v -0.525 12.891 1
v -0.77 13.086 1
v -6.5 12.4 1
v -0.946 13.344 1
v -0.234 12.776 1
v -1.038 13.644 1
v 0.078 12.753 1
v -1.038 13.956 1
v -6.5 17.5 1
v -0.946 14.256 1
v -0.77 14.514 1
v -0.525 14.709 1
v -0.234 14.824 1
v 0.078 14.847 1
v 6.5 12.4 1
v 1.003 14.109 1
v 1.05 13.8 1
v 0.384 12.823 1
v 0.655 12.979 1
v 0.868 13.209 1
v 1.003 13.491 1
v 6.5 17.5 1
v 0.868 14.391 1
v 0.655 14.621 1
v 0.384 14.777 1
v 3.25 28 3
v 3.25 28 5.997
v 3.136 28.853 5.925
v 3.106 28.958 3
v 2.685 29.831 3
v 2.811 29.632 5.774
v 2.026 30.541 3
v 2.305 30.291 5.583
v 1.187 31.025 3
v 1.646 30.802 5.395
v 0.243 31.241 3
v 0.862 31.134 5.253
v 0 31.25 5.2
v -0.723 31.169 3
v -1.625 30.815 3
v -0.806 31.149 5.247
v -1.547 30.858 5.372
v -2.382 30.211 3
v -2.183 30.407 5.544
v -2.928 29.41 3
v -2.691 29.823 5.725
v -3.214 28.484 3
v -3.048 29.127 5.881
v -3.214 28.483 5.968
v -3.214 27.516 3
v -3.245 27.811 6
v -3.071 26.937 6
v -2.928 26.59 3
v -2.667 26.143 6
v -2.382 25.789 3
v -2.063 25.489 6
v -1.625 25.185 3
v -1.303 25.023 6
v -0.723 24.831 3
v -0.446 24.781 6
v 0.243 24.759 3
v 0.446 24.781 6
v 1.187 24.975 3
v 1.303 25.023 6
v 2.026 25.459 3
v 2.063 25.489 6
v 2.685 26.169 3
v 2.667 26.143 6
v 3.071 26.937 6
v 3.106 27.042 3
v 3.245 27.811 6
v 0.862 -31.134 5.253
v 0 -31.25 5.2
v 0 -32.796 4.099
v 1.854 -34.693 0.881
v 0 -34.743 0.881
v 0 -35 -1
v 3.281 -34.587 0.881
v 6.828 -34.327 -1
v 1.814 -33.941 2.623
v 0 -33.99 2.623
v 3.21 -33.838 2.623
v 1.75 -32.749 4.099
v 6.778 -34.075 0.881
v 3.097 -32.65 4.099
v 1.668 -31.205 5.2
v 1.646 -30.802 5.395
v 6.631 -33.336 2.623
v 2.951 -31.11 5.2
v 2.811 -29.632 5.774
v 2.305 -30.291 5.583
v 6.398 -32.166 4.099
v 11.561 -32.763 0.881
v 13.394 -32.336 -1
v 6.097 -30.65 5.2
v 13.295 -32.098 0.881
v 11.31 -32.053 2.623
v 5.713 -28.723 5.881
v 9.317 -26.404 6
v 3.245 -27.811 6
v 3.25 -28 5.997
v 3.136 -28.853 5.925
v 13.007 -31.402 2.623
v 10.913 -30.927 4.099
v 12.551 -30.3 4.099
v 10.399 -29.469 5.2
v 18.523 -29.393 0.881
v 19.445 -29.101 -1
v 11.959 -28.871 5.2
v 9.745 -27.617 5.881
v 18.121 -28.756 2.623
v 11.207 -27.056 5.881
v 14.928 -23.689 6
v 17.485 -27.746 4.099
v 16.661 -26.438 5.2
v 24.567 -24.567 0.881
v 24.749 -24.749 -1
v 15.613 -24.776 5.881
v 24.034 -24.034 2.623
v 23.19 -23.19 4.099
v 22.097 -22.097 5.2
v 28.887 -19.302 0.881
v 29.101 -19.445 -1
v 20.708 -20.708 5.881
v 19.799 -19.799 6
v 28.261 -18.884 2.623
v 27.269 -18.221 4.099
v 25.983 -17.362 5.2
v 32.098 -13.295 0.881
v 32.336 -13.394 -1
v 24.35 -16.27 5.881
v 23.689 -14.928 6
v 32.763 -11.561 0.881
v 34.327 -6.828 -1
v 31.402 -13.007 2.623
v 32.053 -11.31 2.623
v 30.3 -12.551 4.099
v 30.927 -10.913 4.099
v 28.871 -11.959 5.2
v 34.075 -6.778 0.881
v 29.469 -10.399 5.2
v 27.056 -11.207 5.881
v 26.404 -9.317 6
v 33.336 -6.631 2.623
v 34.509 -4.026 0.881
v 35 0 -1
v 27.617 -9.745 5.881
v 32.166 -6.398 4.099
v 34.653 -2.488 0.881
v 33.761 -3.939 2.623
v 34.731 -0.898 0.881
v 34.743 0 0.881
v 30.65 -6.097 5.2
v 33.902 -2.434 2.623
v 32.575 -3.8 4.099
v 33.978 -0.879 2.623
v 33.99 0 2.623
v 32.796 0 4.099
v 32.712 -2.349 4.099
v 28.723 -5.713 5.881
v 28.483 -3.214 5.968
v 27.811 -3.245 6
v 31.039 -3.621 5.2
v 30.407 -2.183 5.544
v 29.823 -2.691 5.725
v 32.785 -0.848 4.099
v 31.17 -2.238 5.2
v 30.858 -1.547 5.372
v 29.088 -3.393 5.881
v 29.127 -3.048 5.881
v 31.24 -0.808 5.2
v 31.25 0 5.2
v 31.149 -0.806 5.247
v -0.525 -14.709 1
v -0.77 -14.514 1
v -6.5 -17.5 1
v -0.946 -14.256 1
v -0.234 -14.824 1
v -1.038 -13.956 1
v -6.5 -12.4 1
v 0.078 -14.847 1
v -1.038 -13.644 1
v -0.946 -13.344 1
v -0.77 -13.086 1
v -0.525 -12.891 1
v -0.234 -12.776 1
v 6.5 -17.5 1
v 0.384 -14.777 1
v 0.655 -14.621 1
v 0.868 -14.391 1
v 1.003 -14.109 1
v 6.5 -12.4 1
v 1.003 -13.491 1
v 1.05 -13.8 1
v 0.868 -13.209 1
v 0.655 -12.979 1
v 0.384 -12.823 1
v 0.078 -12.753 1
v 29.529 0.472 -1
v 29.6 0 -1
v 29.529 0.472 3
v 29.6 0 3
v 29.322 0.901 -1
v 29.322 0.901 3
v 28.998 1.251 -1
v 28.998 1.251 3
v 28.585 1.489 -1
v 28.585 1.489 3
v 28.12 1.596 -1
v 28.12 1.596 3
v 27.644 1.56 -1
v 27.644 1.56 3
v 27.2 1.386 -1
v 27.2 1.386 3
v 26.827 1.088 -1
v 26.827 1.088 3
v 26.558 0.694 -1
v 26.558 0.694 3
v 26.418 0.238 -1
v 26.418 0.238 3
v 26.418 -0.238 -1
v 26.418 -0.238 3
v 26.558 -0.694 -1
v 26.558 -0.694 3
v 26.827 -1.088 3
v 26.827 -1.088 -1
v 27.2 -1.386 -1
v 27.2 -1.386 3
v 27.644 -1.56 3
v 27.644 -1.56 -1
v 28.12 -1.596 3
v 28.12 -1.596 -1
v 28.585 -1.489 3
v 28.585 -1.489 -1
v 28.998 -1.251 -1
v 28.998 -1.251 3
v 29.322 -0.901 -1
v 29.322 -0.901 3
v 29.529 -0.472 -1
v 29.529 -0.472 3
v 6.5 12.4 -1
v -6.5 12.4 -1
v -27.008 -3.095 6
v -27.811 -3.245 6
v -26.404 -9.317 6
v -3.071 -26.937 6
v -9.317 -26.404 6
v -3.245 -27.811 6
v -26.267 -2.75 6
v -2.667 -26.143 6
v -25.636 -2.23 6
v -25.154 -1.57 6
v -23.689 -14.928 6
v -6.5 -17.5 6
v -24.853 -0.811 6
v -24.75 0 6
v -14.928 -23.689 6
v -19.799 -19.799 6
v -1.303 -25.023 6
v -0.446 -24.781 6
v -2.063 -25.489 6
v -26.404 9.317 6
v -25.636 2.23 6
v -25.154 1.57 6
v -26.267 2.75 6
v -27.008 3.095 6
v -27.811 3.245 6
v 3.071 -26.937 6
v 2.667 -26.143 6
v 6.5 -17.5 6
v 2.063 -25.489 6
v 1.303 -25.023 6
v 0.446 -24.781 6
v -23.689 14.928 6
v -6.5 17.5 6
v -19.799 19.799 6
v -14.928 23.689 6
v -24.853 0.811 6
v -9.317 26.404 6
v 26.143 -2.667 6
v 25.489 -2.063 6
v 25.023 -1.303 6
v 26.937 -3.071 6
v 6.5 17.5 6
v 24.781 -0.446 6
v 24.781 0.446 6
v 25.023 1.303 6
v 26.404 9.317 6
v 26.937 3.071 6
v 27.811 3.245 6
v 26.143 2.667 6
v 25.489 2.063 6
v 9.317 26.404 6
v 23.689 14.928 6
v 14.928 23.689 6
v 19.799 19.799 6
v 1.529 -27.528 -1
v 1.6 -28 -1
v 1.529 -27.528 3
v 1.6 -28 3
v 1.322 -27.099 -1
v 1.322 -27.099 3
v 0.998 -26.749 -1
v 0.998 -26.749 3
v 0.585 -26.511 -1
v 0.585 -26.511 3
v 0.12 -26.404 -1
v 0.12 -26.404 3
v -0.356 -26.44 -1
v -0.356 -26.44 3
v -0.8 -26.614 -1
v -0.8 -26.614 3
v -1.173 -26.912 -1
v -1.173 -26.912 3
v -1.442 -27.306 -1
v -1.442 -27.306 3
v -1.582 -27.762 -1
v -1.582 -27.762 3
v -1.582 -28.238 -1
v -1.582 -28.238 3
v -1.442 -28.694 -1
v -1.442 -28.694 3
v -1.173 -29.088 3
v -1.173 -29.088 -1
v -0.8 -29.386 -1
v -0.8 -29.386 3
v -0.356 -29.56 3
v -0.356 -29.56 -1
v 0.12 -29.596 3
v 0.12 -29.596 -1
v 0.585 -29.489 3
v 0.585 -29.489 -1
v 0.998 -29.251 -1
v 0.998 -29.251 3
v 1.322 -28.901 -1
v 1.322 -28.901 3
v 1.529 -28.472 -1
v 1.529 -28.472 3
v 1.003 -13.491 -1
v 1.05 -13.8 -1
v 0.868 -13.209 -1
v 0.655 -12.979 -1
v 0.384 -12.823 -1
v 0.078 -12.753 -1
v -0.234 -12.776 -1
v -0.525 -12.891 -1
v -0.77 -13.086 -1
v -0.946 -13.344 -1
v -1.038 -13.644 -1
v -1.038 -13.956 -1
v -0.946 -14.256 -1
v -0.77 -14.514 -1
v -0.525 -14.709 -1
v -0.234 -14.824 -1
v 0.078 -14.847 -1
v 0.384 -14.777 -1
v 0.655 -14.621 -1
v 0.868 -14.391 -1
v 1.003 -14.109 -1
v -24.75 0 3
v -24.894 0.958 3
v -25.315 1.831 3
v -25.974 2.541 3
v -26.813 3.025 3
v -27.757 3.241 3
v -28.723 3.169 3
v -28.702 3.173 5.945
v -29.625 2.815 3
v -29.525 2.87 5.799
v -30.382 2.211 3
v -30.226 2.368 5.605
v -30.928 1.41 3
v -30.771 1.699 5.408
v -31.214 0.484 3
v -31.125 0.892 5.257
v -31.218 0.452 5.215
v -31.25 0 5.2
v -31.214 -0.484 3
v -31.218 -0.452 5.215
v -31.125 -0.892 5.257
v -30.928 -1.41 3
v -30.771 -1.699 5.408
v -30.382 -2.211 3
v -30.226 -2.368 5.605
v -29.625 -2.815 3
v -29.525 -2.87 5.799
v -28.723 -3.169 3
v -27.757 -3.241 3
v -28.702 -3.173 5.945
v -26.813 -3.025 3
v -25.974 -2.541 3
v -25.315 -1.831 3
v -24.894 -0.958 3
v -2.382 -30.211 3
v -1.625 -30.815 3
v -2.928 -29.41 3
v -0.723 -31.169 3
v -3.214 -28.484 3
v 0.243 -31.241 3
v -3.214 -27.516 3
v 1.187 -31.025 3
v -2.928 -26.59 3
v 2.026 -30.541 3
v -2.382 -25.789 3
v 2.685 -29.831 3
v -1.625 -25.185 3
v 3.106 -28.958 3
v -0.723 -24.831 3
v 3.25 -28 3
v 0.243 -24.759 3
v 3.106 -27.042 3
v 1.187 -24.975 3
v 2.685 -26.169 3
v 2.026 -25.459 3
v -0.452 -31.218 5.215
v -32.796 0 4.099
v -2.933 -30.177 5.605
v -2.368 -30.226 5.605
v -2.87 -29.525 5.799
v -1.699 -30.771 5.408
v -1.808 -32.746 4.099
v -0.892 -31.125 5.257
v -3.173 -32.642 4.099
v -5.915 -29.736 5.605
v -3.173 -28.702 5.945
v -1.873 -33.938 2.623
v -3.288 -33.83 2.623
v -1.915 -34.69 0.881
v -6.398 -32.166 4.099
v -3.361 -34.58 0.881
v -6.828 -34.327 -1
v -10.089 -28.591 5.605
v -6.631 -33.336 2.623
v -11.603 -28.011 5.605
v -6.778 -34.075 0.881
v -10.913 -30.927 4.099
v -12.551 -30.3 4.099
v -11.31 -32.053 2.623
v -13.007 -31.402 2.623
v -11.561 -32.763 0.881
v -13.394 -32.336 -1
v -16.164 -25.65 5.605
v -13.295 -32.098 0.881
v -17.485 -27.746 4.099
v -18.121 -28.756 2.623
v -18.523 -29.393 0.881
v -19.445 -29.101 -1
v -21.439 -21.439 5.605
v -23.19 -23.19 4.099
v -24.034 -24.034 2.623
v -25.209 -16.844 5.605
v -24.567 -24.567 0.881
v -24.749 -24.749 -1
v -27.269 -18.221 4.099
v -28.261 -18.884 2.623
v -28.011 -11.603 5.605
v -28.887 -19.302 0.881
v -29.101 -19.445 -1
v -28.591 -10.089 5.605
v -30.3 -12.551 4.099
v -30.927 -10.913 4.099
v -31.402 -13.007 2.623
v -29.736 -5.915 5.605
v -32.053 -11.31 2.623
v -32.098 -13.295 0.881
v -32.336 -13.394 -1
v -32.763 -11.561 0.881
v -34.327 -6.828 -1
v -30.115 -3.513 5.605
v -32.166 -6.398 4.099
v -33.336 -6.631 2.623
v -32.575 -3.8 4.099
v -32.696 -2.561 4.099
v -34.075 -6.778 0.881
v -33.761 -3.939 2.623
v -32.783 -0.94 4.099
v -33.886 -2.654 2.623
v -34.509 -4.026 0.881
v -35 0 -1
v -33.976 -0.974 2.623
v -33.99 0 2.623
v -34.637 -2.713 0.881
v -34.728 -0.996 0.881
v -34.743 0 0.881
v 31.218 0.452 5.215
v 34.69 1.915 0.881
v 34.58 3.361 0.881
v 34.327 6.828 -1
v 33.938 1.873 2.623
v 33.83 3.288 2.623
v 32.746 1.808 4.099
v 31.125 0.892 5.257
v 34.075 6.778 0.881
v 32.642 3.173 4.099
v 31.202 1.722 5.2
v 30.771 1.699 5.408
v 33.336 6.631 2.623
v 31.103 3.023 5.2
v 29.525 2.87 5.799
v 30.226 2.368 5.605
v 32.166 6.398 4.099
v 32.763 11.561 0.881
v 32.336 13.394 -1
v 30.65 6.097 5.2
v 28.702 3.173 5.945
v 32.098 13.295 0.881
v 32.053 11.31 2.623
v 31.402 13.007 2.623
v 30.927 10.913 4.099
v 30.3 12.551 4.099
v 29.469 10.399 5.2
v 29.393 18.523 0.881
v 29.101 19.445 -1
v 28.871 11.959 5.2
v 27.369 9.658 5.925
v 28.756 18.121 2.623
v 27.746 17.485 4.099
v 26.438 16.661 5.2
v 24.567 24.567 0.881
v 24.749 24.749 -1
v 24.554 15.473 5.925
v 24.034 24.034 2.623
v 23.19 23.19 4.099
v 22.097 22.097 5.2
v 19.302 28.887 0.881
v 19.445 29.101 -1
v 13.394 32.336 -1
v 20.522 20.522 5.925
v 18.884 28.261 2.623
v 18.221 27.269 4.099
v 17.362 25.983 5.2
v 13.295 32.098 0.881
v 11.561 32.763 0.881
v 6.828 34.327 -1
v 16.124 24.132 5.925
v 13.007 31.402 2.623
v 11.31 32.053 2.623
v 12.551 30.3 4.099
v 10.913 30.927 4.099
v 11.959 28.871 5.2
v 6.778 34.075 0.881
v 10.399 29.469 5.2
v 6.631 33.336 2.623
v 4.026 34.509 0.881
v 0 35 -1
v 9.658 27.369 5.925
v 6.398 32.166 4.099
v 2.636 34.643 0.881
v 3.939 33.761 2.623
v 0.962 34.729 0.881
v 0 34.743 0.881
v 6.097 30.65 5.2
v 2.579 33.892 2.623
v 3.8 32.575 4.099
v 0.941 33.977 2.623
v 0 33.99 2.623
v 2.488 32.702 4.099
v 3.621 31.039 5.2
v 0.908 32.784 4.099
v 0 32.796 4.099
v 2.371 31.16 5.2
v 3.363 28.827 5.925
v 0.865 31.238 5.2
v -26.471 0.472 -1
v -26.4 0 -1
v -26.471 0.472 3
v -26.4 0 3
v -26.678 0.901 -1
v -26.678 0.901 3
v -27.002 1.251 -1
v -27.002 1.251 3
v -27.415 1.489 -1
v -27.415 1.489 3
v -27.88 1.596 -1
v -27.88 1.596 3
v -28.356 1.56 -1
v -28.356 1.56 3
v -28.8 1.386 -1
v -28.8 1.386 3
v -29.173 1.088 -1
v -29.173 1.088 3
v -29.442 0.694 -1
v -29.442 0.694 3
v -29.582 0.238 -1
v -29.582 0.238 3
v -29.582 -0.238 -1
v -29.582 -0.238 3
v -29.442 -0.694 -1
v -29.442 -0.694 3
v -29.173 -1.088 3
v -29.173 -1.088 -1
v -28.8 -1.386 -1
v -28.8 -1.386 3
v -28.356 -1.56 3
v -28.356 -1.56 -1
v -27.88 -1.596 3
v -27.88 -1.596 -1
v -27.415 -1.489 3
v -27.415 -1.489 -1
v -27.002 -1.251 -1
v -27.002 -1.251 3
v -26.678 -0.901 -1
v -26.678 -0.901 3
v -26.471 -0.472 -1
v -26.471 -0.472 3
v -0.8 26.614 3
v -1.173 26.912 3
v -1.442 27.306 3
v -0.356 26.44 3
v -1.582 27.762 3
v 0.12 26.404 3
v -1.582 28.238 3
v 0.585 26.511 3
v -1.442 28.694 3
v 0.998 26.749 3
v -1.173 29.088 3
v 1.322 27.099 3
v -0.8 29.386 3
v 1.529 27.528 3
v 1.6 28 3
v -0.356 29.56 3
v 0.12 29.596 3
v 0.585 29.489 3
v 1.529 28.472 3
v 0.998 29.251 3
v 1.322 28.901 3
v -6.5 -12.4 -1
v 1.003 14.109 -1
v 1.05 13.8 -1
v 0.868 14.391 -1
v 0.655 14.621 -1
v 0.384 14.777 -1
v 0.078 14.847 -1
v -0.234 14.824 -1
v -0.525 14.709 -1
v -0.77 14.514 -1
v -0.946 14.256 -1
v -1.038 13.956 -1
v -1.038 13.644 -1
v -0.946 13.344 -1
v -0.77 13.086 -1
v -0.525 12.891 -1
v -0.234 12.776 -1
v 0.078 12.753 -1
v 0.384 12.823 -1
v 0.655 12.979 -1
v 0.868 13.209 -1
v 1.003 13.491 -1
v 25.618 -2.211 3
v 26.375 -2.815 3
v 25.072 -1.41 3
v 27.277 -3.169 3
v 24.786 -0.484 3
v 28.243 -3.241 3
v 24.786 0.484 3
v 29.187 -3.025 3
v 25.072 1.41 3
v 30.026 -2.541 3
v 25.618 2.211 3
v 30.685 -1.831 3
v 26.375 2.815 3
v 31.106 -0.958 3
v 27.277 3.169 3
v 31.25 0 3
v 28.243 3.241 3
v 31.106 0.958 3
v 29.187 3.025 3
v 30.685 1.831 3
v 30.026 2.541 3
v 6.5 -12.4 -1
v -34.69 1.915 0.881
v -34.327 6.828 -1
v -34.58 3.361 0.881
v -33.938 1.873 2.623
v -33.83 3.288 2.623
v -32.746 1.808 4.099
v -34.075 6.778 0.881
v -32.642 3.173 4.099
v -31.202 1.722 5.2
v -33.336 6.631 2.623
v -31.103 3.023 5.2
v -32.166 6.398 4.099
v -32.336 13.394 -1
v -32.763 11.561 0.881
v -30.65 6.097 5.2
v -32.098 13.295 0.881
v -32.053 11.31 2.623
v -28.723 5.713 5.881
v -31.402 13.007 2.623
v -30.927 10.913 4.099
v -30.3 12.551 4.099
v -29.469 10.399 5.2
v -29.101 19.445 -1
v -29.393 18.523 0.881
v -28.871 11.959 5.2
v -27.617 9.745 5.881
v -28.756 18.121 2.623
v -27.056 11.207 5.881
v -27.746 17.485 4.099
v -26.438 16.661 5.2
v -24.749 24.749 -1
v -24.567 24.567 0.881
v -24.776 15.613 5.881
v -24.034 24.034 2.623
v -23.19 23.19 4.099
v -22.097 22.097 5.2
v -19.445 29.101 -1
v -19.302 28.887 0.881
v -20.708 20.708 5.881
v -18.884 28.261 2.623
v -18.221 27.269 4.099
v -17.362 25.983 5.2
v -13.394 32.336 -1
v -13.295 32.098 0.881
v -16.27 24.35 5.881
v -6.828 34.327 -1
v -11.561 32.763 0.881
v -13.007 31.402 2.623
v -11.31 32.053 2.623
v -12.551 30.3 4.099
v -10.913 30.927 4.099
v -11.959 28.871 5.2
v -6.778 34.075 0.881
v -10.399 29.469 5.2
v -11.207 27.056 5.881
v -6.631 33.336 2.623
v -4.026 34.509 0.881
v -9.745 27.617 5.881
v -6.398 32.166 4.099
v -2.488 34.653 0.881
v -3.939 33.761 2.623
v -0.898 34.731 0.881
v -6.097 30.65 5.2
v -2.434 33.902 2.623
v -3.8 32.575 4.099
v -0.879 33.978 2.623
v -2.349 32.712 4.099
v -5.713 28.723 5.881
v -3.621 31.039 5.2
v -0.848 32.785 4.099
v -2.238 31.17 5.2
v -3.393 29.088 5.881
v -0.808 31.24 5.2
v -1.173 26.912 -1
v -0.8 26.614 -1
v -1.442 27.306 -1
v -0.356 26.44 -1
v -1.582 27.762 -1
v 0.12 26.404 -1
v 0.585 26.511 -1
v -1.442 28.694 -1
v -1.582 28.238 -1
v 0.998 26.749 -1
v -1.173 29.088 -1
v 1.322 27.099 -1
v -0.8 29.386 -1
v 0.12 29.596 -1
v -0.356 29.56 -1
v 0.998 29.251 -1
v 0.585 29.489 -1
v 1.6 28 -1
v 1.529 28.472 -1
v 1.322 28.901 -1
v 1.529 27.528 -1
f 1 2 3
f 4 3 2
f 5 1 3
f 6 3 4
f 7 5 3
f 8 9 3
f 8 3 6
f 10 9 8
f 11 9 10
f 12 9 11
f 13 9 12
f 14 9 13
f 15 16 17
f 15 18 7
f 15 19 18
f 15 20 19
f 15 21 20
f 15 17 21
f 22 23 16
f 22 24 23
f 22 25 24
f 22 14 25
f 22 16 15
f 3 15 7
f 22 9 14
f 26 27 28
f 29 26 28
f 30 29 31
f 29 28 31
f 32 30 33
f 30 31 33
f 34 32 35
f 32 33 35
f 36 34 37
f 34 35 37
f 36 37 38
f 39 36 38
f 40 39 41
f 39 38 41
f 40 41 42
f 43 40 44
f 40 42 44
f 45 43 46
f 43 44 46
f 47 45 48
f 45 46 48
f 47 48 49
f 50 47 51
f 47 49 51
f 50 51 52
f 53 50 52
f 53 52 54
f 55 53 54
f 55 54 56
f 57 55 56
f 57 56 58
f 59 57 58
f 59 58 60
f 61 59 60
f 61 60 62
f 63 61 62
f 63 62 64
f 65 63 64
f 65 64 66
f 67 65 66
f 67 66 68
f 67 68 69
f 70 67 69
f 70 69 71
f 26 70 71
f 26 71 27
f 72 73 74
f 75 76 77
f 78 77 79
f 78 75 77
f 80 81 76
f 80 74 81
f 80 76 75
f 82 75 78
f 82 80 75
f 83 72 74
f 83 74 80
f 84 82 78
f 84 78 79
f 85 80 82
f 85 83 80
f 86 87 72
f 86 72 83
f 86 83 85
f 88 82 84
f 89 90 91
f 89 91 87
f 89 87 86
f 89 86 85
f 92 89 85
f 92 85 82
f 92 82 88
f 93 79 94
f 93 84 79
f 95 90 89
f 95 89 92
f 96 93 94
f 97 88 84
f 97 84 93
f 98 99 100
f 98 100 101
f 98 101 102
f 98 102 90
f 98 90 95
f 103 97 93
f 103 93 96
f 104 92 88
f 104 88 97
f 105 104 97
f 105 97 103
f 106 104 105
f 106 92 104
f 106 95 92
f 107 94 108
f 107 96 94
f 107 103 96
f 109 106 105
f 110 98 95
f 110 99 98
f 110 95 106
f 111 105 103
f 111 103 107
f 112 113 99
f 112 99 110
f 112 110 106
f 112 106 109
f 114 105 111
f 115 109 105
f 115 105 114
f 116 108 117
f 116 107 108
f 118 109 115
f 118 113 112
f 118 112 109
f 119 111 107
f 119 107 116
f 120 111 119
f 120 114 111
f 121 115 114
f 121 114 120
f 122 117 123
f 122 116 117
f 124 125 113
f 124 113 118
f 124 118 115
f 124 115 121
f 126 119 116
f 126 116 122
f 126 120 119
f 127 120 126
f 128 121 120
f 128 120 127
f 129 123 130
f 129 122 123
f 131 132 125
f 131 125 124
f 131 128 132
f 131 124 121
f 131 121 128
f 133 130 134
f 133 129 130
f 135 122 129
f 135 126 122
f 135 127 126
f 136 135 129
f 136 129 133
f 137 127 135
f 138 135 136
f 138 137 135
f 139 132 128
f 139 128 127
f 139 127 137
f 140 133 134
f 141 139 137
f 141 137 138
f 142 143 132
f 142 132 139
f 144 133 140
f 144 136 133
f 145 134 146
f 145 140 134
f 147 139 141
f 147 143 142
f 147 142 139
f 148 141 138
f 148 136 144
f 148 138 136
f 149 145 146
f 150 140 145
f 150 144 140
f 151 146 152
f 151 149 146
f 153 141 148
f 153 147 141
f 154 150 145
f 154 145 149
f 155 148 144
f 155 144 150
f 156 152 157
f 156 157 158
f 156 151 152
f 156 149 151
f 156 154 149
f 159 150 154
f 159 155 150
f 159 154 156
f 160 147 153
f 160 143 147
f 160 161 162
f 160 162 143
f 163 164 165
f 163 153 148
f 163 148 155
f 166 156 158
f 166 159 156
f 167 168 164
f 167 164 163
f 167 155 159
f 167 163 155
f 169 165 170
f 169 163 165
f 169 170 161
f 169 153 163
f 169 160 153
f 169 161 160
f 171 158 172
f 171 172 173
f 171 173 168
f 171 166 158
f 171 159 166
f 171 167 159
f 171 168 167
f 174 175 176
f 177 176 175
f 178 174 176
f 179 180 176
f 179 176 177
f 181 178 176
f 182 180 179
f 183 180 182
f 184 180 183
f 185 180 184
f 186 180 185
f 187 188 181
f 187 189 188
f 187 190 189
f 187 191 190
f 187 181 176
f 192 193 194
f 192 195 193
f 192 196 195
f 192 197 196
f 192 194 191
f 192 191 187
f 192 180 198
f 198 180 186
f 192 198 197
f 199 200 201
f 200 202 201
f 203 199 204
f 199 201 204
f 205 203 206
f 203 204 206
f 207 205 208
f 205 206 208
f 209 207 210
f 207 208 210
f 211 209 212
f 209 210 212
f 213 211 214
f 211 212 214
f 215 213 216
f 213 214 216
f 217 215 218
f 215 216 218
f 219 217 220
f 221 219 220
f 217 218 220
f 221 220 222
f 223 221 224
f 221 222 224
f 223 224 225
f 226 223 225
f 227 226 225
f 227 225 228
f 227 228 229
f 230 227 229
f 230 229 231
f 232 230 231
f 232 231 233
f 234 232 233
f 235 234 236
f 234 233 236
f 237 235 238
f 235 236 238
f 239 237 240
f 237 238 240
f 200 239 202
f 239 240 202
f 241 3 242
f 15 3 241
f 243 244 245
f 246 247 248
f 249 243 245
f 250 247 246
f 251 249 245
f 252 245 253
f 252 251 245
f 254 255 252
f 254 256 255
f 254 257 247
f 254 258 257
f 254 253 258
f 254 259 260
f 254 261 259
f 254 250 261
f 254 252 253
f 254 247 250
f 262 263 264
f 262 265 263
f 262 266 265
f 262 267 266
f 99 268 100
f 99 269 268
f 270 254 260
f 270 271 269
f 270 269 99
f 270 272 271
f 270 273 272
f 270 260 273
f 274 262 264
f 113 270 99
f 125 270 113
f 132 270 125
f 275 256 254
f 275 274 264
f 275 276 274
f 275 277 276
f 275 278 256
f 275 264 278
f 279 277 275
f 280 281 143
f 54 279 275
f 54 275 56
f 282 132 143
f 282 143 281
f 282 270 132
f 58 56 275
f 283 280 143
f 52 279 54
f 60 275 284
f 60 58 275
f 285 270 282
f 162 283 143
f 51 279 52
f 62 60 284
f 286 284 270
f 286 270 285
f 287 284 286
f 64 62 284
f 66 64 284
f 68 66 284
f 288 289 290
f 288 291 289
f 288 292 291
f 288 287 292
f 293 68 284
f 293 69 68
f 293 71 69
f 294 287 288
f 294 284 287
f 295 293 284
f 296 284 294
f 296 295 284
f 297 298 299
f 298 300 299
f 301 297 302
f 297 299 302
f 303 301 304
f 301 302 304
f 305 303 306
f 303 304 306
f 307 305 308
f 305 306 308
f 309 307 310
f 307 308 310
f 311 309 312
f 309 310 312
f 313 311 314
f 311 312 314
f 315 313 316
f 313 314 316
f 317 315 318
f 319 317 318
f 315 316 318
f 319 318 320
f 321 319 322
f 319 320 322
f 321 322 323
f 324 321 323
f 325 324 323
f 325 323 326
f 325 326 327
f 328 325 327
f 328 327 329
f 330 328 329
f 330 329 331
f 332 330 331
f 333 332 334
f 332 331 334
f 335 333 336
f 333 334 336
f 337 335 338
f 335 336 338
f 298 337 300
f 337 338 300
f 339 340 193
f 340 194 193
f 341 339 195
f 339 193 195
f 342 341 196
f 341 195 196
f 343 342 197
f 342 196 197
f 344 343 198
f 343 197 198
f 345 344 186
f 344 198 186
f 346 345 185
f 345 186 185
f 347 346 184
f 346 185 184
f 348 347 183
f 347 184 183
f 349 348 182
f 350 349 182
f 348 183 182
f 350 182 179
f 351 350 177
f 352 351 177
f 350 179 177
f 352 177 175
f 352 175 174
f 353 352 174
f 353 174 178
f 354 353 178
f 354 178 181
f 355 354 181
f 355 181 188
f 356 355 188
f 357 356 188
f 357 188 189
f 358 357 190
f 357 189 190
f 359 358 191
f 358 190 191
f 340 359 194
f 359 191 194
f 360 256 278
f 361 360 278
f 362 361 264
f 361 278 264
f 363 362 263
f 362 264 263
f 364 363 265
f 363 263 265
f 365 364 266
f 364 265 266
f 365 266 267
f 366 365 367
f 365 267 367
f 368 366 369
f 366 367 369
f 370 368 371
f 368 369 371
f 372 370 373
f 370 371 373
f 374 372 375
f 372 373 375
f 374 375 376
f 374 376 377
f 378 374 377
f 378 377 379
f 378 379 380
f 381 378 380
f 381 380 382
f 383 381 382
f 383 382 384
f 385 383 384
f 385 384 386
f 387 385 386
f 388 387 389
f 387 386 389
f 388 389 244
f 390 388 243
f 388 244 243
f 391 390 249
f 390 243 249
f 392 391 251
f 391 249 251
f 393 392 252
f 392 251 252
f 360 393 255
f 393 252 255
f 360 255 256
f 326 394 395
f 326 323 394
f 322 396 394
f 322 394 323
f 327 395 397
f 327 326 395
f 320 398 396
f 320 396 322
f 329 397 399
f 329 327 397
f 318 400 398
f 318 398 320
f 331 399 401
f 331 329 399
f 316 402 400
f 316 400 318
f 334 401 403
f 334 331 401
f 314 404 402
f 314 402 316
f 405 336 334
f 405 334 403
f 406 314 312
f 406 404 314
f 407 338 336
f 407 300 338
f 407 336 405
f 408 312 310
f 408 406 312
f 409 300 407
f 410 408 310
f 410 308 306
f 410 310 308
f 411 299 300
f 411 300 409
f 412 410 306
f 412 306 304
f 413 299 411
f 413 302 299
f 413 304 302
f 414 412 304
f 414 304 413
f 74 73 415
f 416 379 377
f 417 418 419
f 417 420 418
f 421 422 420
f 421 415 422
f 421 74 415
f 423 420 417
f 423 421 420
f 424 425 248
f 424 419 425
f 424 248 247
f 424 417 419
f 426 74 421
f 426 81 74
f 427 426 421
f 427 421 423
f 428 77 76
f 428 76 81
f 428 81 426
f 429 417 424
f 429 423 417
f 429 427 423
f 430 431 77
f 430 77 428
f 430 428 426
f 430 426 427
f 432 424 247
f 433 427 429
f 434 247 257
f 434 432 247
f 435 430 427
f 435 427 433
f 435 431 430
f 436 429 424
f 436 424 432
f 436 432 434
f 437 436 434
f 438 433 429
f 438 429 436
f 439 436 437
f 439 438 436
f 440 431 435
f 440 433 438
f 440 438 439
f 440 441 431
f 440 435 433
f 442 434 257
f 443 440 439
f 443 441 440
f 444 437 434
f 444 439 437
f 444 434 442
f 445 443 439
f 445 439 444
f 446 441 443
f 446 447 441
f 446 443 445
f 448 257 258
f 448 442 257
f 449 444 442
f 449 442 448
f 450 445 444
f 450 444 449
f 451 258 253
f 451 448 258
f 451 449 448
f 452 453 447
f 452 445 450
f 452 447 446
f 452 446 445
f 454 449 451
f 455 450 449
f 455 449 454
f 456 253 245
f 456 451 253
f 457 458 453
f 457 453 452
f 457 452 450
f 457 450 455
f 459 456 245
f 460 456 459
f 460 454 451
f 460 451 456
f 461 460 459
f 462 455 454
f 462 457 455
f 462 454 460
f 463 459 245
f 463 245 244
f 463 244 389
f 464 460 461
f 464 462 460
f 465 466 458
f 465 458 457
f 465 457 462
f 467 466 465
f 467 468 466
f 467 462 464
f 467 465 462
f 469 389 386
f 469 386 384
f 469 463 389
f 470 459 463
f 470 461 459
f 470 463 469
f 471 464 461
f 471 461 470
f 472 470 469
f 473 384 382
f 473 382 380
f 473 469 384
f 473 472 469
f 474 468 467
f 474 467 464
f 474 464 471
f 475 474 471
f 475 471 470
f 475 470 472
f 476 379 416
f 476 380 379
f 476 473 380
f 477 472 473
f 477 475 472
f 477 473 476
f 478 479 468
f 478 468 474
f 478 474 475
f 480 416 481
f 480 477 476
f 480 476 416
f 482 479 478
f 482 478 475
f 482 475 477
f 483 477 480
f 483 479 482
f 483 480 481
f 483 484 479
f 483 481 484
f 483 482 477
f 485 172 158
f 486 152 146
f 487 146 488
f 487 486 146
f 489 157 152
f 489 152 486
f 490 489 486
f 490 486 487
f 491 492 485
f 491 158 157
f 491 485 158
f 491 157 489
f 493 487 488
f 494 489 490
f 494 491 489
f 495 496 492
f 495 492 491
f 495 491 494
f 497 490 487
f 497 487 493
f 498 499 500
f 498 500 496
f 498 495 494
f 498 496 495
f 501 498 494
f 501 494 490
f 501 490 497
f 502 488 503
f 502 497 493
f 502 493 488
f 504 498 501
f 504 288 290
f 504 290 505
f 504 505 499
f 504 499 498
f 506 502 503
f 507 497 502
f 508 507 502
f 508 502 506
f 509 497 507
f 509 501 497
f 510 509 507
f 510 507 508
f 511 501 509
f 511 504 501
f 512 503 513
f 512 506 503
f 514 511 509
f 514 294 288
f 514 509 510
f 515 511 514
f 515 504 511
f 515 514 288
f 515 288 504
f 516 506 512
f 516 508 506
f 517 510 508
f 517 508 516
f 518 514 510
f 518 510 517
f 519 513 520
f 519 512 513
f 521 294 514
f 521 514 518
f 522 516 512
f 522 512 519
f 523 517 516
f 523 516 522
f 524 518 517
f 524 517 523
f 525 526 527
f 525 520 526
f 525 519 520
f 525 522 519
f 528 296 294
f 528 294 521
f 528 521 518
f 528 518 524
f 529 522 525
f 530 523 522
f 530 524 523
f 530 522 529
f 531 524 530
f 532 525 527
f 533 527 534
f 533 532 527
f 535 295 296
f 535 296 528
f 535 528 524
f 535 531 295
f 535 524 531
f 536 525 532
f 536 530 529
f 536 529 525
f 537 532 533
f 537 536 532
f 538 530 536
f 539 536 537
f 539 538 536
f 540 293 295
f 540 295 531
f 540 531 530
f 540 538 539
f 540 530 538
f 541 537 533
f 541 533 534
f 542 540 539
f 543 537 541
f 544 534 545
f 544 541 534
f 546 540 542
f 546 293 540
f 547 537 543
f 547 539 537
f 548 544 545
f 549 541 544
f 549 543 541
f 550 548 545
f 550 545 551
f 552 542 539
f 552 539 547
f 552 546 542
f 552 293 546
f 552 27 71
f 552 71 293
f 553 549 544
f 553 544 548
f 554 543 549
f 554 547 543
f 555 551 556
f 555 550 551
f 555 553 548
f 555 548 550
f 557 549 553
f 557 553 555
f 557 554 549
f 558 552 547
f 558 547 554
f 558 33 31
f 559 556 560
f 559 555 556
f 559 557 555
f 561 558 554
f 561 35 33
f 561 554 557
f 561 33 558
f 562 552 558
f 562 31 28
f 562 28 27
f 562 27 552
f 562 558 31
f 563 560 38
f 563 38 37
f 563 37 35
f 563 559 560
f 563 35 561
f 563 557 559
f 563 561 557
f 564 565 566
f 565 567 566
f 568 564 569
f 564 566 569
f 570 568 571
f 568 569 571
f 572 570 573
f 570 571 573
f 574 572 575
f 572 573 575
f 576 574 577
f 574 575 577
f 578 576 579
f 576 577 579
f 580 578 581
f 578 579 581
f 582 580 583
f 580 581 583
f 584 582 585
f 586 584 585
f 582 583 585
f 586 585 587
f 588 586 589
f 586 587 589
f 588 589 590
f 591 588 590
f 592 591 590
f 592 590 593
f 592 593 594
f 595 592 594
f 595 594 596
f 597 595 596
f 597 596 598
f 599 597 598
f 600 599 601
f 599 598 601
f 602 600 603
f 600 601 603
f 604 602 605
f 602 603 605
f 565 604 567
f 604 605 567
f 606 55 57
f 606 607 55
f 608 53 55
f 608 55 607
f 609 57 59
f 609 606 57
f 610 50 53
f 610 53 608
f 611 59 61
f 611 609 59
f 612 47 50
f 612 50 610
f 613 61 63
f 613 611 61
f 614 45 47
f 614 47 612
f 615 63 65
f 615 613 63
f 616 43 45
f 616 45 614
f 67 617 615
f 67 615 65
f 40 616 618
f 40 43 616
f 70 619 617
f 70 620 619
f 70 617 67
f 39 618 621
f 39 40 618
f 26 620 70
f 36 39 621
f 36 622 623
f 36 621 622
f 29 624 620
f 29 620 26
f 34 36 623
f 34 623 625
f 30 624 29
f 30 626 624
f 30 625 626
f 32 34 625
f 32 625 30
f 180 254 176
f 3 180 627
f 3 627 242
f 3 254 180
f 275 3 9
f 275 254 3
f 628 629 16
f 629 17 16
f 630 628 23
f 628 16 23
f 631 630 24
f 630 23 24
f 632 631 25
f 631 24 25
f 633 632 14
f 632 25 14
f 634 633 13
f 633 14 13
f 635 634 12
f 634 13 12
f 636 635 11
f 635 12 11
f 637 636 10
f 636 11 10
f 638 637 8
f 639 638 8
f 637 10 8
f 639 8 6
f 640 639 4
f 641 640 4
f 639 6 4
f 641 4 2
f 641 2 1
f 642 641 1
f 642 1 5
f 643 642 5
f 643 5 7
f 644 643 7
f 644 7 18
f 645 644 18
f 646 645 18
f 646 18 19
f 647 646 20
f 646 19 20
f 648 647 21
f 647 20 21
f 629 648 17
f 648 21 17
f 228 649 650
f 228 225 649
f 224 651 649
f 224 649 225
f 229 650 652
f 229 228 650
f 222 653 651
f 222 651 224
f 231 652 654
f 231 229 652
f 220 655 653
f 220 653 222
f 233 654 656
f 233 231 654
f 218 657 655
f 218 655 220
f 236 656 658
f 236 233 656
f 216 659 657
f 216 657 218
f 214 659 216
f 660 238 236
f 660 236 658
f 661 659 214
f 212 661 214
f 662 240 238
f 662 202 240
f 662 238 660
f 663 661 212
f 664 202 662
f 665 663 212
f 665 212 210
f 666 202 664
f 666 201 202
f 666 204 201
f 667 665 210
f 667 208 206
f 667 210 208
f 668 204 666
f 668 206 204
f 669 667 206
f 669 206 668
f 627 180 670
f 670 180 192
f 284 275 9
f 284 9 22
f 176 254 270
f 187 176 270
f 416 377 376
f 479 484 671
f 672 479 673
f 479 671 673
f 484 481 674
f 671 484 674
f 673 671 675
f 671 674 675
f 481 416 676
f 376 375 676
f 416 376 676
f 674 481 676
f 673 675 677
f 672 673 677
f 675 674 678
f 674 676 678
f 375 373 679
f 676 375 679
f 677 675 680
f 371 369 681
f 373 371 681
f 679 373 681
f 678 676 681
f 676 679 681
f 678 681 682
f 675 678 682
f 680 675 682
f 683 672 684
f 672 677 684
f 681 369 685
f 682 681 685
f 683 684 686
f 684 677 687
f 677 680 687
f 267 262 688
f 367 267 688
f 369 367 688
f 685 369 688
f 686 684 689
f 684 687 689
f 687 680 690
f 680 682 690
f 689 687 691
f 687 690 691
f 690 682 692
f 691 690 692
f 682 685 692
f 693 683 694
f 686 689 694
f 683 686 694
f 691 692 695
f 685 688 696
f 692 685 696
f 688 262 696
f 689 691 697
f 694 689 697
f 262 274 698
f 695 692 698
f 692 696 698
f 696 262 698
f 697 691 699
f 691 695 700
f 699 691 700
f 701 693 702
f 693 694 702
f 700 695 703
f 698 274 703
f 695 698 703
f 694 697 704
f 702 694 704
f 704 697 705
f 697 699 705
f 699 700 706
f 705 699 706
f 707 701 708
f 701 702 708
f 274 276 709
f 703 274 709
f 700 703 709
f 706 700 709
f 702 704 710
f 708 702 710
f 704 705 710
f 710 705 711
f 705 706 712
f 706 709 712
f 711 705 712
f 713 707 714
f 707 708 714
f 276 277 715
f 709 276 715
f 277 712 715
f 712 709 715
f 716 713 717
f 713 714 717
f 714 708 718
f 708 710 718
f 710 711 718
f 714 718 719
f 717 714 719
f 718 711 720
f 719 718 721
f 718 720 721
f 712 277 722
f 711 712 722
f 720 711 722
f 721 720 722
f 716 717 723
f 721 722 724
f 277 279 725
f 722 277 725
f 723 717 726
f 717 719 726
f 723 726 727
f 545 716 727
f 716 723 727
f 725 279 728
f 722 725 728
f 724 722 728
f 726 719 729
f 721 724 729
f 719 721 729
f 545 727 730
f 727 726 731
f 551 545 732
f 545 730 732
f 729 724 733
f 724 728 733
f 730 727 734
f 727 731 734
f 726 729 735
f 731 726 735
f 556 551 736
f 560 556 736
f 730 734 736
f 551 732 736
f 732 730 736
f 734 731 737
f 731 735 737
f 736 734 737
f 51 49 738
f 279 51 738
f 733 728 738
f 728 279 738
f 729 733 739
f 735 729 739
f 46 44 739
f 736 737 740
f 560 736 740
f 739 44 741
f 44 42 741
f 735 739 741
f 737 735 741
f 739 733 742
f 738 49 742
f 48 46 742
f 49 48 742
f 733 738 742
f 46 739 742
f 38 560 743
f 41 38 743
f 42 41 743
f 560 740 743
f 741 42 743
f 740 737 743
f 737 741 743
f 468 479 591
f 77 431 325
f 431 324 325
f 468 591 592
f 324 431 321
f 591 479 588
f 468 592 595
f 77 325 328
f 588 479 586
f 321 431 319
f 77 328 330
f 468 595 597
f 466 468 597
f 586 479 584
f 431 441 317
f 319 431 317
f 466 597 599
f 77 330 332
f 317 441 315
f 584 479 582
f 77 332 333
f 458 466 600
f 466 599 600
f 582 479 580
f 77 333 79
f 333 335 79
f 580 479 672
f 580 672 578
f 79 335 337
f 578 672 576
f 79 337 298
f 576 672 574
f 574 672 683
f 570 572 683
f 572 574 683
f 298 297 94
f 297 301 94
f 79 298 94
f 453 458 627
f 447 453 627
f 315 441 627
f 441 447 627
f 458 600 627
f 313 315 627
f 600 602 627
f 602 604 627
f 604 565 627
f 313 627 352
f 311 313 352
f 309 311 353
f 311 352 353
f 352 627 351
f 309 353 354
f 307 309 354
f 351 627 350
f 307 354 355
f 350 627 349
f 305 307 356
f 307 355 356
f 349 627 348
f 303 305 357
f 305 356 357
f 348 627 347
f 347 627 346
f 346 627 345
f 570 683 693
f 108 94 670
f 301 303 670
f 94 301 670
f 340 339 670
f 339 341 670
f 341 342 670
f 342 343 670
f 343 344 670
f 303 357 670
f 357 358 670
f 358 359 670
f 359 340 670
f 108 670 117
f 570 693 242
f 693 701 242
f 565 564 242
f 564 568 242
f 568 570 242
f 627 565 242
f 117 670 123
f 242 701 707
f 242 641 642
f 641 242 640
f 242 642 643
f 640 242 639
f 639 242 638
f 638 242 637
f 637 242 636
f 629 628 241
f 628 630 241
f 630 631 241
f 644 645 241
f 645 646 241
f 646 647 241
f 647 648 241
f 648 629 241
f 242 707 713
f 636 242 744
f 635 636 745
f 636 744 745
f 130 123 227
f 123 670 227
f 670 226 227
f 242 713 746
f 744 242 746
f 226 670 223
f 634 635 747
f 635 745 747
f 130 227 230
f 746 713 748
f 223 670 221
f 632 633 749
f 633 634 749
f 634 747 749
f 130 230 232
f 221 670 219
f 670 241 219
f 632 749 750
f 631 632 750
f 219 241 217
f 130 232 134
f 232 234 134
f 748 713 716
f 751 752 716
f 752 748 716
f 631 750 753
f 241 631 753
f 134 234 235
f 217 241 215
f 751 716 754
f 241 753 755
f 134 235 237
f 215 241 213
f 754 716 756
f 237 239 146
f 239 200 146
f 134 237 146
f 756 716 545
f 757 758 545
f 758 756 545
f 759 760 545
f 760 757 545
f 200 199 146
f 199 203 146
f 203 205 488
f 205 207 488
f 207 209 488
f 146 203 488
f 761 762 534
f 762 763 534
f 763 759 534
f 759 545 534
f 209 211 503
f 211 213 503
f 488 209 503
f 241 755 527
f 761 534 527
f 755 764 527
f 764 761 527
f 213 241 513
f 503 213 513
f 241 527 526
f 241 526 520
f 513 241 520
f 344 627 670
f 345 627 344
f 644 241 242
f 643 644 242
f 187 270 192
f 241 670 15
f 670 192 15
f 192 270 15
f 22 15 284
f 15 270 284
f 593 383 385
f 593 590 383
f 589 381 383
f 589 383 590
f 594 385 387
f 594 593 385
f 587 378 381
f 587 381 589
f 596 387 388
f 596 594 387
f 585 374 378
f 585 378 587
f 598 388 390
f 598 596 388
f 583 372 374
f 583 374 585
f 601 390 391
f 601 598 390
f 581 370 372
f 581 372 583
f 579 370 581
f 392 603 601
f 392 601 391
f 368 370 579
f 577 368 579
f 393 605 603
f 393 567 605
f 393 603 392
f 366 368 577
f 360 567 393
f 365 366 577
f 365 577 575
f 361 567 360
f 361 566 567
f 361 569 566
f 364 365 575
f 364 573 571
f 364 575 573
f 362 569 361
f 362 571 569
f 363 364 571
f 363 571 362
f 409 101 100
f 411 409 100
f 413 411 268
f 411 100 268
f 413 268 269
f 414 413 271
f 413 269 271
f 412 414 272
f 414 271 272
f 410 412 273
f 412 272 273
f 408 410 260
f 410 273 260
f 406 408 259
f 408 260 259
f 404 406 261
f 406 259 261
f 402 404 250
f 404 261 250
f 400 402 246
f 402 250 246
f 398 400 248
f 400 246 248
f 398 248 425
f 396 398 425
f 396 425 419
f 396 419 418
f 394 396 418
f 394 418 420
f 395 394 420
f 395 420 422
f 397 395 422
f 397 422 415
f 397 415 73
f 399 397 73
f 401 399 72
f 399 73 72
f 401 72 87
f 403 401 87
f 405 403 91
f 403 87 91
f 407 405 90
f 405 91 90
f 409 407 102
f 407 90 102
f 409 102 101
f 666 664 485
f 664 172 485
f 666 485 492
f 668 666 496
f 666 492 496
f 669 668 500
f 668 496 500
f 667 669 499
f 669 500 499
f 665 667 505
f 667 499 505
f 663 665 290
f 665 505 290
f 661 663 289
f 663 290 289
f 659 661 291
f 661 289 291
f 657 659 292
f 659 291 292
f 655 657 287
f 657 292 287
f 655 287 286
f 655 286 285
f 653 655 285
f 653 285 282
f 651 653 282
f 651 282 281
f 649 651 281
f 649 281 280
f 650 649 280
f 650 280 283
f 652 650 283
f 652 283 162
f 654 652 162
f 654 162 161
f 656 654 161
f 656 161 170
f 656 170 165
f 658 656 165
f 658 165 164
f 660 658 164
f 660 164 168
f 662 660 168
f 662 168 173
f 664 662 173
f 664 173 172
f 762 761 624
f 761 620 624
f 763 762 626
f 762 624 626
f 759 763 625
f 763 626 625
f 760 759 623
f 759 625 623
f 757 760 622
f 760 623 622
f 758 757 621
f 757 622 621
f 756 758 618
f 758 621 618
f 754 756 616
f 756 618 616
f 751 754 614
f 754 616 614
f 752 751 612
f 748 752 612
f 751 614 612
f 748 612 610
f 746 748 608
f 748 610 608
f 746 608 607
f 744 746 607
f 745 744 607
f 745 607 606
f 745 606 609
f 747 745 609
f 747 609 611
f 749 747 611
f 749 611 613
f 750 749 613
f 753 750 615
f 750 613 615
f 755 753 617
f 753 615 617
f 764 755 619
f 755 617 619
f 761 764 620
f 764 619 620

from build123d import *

# Parameters (mm, degrees)
F0_W          = 70
F0_H          = 70
F1_DEPTH      = 10
F2_W          = 13
F2_H          = 24.8
F3_DEPTH      = 25
F4_W          = 70
F4_H          = 70
F4_W_2        = 40
F4_H_2        = 40
F5_DEPTH      = 4
F6_W          = 13
F6_H          = 35
F7_DEPTH      = 9
F8_R          = 1.05
F9_DEPTH      = 25
F10_R         = 1.6
F11_DEPTH     = 25
F12_R         = 3.25
F13_DEPTH     = 3
F14_DEPTH     = 4
F15_R         = 34.99999
F16_DEPTH     = 1
F17_T1_DEPTH  = 2e-05
F17_T3_DEPTH  = 2e-05
F17_T6_ANGLE  = 90
F17_T8_ANGLE  = 90
F17_T10_ANGLE = 90
F17_T12_ANGLE = 90


# Not quite as in the source:
# - a fillet or chamfer that OpenCascade refuses, or shapes differently, is made with other operations: its cross-section is extruded or revolved along the edge and cut away or added
# - a fillet or chamfer is up to 0.001 mm smaller than in the source, because OpenCascade refuses the exact size


with BuildPart() as f1:
    # F0 (on Top) → F1 (new body)
    with BuildSketch(Plane.XY):
        Rectangle(F0_W, F0_H)
    extrude(amount=F1_DEPTH)

    # F2 (on face) → F3 (cut)
    with BuildSketch(Plane.XY.offset(10)):
        Rectangle(F2_W, F2_H)
    extrude(amount=-F3_DEPTH, mode=Mode.SUBTRACT)

    # F4 (on face) → F5 (cut)
    with BuildSketch(Plane.XY.offset(10)):
        Rectangle(F4_W, F4_H)
        Rectangle(F4_W_2, F4_H_2, mode=Mode.SUBTRACT)
    extrude(amount=-F5_DEPTH, mode=Mode.SUBTRACT)

    # F6 (on face) → F7 (cut)
    with BuildSketch(Plane.XY.offset(10)):
        Rectangle(F6_W, F6_H)
    extrude(amount=-F7_DEPTH, mode=Mode.SUBTRACT)

    # F8 (on face) → F9 (cut)
    with BuildSketch(Plane.XY.offset(1)):
        with Locations((0, 13.8)):
            Circle(F8_R)
        with Locations((0, -13.8)):
            Circle(F8_R)
    extrude(amount=-F9_DEPTH, mode=Mode.SUBTRACT)

    # F10 (on face) → F11 (cut)
    with BuildSketch(Plane.XY.offset(6)):
        with Locations((-28, 0)):
            Circle(F10_R)
        with Locations((28, 0)):
            Circle(F10_R)
        with Locations((0, -28)):
            Circle(F10_R)
        with Locations((0, 28)):
            Circle(F10_R)
    extrude(amount=-F11_DEPTH, mode=Mode.SUBTRACT)

    # F12 (on face) → F13 (cut)
    with BuildSketch(Plane.XY.offset(6)):
        with Locations((-28, 0)):
            Circle(F12_R)
        with Locations((28, 0)):
            Circle(F12_R)
        with Locations((0, -28)):
            Circle(F12_R)
        with Locations((0, 28)):
            Circle(F12_R)
    extrude(amount=-F13_DEPTH, mode=Mode.SUBTRACT)

    # F14 (cut, through all): a face of the model
    f14_faces = [f1.faces().sort_by_distance(p)[0] for p in [
        (-19.4343145751, 0, 10),
    ]]
    extrude(f14_faces, amount=-F14_DEPTH, mode=Mode.SUBTRACT)

    # F15 (radius 35 in the source; OpenCascade refuses exactly that, so slightly less here)
    f15_edges = [f1.edges().sort_by_distance(p)[0] for p in [
        (-35, -35, 3),
        (35, -35, 3),
        (35, 35, 3),
        (-35, 35, 3),
    ]]
    fillet(f15_edges, radius=F15_R)

    # F16 (add): a face of the model
    f16_faces = [f1.faces().sort_by_distance(p)[0] for p in [
        (0, -34.0100505063, 0),
    ]]
    extrude(f16_faces, amount=F16_DEPTH)

    # F17: fillet of radius 7 on 1 edges, made by hand

    # F17_s2 → F17_t1 (cut)
    with BuildSketch(Plane.YZ.offset(-1e-05)):
        with BuildLine():
            ThreePointArc((-35, -1), (-32.9497474683, 3.9497474683), (-28, 6))
            Line((-28, 6), (-35, 6))
            Line((-35, 6), (-35, -1))
        make_face()
        with BuildLine():
            ThreePointArc((35, -1), (32.9497474683, 3.9497474683), (28, 6))
            Line((28, 6), (35, 6))
            Line((35, 6), (35, -1))
        make_face()
    extrude(amount=F17_T1_DEPTH, mode=Mode.SUBTRACT)

    # F17_s4 → F17_t3 (cut)
    with BuildSketch(Plane.XZ.offset(-1e-05)):
        with BuildLine():
            ThreePointArc((35, -1), (32.9497474683, 3.9497474683), (28, 6))
            Line((28, 6), (35, 6))
            Line((35, 6), (35, -1))
        make_face()
        with BuildLine():
            ThreePointArc((-35, -1), (-32.9497474683, 3.9497474683), (-28, 6))
            Line((-28, 6), (-35, 6))
            Line((-35, 6), (-35, -1))
        make_face()
    extrude(amount=F17_T3_DEPTH, mode=Mode.SUBTRACT)

    # F17_s5 → F17_t6 (revolve, cut)
    with BuildSketch(Plane.YZ.offset(1e-05)):
        with BuildLine():
            ThreePointArc((-35, -1), (-32.9497474683, 3.9497474683), (-28, 6))
            Line((-28, 6), (-35, 6))
            Line((-35, 6), (-35, -1))
        make_face()
    revolve(axis=Axis((1e-05, -1e-05, 6), (0, 0, 1)), revolution_arc=F17_T6_ANGLE, mode=Mode.SUBTRACT)

    # F17_s7 → F17_t8 (revolve, cut)
    with BuildSketch(Plane.XZ.offset(-1e-05)):
        with BuildLine():
            ThreePointArc((35, -1), (32.9497474683, 3.9497474683), (28, 6))
            Line((28, 6), (35, 6))
            Line((35, 6), (35, -1))
        make_face()
    revolve(axis=Axis((1e-05, 1e-05, 6), (0, 0, 1)), revolution_arc=F17_T8_ANGLE, mode=Mode.SUBTRACT)

    # F17_s9 → F17_t10 (revolve, cut)
    with BuildSketch(Plane.XZ.offset(-1e-05)):
        with BuildLine():
            ThreePointArc((-35, -1), (-32.9497474683, 3.9497474683), (-28, 6))
            Line((-28, 6), (-35, 6))
            Line((-35, 6), (-35, -1))
        make_face()
    revolve(axis=Axis((-1e-05, 1e-05, 6), (0, 0, -1)), revolution_arc=F17_T10_ANGLE, mode=Mode.SUBTRACT)

    # F17_s11 → F17_t12 (revolve, cut)
    with BuildSketch(Plane.YZ.offset(-1e-05)):
        with BuildLine():
            ThreePointArc((-28, 6), (-32.9497474683, 3.9497474683), (-35, -1))
            Line((-35, -1), (-35, 6))
            Line((-35, 6), (-28, 6))
        make_face()
    revolve(axis=Axis((-1e-05, -1e-05, 6), (0, 0, -1)), revolution_arc=F17_T12_ANGLE, mode=Mode.SUBTRACT)


solid = f1.part
